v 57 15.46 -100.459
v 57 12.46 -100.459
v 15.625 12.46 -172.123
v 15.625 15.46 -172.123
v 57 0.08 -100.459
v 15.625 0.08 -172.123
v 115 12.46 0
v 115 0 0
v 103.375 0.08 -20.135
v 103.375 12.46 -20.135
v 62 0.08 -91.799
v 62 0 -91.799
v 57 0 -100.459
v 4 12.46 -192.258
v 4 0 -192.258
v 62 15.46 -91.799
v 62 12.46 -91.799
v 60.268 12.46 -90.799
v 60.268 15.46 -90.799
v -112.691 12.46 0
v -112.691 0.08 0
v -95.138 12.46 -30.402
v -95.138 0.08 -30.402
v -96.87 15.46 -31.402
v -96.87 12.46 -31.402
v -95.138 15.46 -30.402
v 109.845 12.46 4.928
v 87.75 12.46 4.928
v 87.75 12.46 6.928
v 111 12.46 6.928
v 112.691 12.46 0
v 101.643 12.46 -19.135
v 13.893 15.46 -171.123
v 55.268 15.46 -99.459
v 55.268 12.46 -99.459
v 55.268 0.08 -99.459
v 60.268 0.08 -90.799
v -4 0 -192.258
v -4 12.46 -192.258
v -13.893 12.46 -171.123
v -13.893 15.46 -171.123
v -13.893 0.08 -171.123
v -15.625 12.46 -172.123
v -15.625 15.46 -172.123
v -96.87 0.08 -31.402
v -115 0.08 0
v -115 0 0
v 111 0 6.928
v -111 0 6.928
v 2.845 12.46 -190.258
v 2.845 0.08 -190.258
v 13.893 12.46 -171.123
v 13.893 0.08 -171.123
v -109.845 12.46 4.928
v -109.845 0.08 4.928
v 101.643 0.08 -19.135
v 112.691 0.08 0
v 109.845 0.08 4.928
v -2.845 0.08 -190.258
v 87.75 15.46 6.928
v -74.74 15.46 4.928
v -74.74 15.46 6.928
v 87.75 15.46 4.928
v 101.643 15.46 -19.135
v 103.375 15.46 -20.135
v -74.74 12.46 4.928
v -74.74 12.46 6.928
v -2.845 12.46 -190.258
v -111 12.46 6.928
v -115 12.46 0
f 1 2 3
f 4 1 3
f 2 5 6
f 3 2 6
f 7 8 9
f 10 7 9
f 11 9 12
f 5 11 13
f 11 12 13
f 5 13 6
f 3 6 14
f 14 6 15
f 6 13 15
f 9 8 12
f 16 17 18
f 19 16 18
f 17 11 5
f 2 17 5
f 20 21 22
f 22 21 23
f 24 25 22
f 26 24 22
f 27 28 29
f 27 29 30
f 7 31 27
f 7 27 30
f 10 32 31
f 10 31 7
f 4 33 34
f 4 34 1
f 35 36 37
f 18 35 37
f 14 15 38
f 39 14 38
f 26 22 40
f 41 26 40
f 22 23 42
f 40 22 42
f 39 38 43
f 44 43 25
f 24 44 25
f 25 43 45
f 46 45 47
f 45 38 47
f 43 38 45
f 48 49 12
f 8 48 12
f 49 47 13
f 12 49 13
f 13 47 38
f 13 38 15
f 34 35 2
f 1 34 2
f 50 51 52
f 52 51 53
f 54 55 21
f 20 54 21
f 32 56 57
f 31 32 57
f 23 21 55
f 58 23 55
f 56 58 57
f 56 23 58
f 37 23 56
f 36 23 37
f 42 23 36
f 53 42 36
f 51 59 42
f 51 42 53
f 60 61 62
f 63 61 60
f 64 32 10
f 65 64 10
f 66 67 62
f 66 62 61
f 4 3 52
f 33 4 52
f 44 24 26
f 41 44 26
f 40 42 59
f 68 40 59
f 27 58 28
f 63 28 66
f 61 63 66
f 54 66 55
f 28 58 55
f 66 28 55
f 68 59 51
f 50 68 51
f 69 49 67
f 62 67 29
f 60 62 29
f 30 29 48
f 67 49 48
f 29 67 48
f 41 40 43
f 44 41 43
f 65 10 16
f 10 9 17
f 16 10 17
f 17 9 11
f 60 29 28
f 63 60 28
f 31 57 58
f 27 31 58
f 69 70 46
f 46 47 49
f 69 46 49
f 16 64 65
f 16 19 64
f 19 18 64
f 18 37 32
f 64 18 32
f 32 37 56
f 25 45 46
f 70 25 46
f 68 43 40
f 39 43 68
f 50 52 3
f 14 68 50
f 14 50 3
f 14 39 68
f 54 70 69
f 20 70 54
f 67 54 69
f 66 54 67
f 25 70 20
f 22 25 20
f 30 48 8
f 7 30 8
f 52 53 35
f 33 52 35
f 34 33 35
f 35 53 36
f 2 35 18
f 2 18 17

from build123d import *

# Parameters (mm, degrees)
BOSS_EXTRUDE1_DEPTH = 0.08
BOSS_EXTRUDE2_DEPTH = 12.46
SKETCH1_4_W         = 162.49
SKETCH1_4_H         = 2
BOSS_EXTRUDE3_DEPTH = 15.46


# Read off the part's stored shape, not the designer's step: Boss-Extrude2
with BuildPart() as part:
    # Sketch1 → Boss-Extrude1 (new body)
    with BuildSketch(Plane(origin=(0, 0, 0), x_dir=(1, 0, 0), z_dir=(0, 1, 0))):
        Polygon((-115, 0), (-111, -6.92820323), (111, -6.92820323), (115, 0), (15.625, 172.122549002), (13.892949192, 171.122549002), (2.845299462, 190.25763964), (-2.845299462, 190.25763964), (-13.892949192, 171.122549002), (-15.625, 172.122549002), align=None)
    extrude(amount=BOSS_EXTRUDE1_DEPTH)

    # Boss-Extrude2 outline → Boss-Extrude2 (add)
    with BuildSketch(Plane(origin=(0, 0, 0), x_dir=(1, 0, 0), z_dir=(0, 1, 0))):
        Polygon((15.625, 172.122549002), (4, 192.25763964), (-4, 192.25763964), (-15.625, 172.122549002), (-13.892949192, 171.122549002), (-2.845299462, 190.25763964), (2.845299462, 190.25763964), (13.892949192, 171.122549002), align=None)
        Polygon((62, 91.798692801), (57, 100.458946839), (55.267949192, 99.458946839), (60.267949192, 90.798692801), align=None)
        Polygon((-95.137949192, 30.402081141), (-96.87, 31.402081141), (-115, 0), (-111, -6.92820323), (-74.74, -6.92820323), (-74.74, -4.92820323), (-109.845299462, -4.92820323), (-112.690598923, 0), align=None)
        Polygon((115, 0), (103.375, 20.135090638), (101.642949192, 19.135090638), (112.690598923, 0), (109.845299462, -4.92820323), (87.75, -4.92820323), (87.75, -6.92820323), (111, -6.92820323), align=None)
    extrude(amount=BOSS_EXTRUDE2_DEPTH)

    # Sketch1<4> → Boss-Extrude3 (add)
    with BuildSketch(Plane(origin=(0, 0, 0), x_dir=(1, 0, 0), z_dir=(0, 1, 0))):
        Polygon((-15.625, 172.122549002), (-96.87, 31.402081141), (-95.137949192, 30.402081141), (-13.892949192, 171.122549002), align=None)
        with Locations((6.505, -5.92820323)):
            Rectangle(SKETCH1_4_W, SKETCH1_4_H)
        Polygon((57, 100.458946839), (15.625, 172.122549002), (13.892949192, 171.122549002), (55.267949192, 99.458946839), align=None)
        Polygon((101.642949192, 19.135090638), (103.375, 20.135090638), (62, 91.798692801), (60.267949192, 90.798692801), align=None)
    extrude(amount=BOSS_EXTRUDE3_DEPTH)


solid = part.part
